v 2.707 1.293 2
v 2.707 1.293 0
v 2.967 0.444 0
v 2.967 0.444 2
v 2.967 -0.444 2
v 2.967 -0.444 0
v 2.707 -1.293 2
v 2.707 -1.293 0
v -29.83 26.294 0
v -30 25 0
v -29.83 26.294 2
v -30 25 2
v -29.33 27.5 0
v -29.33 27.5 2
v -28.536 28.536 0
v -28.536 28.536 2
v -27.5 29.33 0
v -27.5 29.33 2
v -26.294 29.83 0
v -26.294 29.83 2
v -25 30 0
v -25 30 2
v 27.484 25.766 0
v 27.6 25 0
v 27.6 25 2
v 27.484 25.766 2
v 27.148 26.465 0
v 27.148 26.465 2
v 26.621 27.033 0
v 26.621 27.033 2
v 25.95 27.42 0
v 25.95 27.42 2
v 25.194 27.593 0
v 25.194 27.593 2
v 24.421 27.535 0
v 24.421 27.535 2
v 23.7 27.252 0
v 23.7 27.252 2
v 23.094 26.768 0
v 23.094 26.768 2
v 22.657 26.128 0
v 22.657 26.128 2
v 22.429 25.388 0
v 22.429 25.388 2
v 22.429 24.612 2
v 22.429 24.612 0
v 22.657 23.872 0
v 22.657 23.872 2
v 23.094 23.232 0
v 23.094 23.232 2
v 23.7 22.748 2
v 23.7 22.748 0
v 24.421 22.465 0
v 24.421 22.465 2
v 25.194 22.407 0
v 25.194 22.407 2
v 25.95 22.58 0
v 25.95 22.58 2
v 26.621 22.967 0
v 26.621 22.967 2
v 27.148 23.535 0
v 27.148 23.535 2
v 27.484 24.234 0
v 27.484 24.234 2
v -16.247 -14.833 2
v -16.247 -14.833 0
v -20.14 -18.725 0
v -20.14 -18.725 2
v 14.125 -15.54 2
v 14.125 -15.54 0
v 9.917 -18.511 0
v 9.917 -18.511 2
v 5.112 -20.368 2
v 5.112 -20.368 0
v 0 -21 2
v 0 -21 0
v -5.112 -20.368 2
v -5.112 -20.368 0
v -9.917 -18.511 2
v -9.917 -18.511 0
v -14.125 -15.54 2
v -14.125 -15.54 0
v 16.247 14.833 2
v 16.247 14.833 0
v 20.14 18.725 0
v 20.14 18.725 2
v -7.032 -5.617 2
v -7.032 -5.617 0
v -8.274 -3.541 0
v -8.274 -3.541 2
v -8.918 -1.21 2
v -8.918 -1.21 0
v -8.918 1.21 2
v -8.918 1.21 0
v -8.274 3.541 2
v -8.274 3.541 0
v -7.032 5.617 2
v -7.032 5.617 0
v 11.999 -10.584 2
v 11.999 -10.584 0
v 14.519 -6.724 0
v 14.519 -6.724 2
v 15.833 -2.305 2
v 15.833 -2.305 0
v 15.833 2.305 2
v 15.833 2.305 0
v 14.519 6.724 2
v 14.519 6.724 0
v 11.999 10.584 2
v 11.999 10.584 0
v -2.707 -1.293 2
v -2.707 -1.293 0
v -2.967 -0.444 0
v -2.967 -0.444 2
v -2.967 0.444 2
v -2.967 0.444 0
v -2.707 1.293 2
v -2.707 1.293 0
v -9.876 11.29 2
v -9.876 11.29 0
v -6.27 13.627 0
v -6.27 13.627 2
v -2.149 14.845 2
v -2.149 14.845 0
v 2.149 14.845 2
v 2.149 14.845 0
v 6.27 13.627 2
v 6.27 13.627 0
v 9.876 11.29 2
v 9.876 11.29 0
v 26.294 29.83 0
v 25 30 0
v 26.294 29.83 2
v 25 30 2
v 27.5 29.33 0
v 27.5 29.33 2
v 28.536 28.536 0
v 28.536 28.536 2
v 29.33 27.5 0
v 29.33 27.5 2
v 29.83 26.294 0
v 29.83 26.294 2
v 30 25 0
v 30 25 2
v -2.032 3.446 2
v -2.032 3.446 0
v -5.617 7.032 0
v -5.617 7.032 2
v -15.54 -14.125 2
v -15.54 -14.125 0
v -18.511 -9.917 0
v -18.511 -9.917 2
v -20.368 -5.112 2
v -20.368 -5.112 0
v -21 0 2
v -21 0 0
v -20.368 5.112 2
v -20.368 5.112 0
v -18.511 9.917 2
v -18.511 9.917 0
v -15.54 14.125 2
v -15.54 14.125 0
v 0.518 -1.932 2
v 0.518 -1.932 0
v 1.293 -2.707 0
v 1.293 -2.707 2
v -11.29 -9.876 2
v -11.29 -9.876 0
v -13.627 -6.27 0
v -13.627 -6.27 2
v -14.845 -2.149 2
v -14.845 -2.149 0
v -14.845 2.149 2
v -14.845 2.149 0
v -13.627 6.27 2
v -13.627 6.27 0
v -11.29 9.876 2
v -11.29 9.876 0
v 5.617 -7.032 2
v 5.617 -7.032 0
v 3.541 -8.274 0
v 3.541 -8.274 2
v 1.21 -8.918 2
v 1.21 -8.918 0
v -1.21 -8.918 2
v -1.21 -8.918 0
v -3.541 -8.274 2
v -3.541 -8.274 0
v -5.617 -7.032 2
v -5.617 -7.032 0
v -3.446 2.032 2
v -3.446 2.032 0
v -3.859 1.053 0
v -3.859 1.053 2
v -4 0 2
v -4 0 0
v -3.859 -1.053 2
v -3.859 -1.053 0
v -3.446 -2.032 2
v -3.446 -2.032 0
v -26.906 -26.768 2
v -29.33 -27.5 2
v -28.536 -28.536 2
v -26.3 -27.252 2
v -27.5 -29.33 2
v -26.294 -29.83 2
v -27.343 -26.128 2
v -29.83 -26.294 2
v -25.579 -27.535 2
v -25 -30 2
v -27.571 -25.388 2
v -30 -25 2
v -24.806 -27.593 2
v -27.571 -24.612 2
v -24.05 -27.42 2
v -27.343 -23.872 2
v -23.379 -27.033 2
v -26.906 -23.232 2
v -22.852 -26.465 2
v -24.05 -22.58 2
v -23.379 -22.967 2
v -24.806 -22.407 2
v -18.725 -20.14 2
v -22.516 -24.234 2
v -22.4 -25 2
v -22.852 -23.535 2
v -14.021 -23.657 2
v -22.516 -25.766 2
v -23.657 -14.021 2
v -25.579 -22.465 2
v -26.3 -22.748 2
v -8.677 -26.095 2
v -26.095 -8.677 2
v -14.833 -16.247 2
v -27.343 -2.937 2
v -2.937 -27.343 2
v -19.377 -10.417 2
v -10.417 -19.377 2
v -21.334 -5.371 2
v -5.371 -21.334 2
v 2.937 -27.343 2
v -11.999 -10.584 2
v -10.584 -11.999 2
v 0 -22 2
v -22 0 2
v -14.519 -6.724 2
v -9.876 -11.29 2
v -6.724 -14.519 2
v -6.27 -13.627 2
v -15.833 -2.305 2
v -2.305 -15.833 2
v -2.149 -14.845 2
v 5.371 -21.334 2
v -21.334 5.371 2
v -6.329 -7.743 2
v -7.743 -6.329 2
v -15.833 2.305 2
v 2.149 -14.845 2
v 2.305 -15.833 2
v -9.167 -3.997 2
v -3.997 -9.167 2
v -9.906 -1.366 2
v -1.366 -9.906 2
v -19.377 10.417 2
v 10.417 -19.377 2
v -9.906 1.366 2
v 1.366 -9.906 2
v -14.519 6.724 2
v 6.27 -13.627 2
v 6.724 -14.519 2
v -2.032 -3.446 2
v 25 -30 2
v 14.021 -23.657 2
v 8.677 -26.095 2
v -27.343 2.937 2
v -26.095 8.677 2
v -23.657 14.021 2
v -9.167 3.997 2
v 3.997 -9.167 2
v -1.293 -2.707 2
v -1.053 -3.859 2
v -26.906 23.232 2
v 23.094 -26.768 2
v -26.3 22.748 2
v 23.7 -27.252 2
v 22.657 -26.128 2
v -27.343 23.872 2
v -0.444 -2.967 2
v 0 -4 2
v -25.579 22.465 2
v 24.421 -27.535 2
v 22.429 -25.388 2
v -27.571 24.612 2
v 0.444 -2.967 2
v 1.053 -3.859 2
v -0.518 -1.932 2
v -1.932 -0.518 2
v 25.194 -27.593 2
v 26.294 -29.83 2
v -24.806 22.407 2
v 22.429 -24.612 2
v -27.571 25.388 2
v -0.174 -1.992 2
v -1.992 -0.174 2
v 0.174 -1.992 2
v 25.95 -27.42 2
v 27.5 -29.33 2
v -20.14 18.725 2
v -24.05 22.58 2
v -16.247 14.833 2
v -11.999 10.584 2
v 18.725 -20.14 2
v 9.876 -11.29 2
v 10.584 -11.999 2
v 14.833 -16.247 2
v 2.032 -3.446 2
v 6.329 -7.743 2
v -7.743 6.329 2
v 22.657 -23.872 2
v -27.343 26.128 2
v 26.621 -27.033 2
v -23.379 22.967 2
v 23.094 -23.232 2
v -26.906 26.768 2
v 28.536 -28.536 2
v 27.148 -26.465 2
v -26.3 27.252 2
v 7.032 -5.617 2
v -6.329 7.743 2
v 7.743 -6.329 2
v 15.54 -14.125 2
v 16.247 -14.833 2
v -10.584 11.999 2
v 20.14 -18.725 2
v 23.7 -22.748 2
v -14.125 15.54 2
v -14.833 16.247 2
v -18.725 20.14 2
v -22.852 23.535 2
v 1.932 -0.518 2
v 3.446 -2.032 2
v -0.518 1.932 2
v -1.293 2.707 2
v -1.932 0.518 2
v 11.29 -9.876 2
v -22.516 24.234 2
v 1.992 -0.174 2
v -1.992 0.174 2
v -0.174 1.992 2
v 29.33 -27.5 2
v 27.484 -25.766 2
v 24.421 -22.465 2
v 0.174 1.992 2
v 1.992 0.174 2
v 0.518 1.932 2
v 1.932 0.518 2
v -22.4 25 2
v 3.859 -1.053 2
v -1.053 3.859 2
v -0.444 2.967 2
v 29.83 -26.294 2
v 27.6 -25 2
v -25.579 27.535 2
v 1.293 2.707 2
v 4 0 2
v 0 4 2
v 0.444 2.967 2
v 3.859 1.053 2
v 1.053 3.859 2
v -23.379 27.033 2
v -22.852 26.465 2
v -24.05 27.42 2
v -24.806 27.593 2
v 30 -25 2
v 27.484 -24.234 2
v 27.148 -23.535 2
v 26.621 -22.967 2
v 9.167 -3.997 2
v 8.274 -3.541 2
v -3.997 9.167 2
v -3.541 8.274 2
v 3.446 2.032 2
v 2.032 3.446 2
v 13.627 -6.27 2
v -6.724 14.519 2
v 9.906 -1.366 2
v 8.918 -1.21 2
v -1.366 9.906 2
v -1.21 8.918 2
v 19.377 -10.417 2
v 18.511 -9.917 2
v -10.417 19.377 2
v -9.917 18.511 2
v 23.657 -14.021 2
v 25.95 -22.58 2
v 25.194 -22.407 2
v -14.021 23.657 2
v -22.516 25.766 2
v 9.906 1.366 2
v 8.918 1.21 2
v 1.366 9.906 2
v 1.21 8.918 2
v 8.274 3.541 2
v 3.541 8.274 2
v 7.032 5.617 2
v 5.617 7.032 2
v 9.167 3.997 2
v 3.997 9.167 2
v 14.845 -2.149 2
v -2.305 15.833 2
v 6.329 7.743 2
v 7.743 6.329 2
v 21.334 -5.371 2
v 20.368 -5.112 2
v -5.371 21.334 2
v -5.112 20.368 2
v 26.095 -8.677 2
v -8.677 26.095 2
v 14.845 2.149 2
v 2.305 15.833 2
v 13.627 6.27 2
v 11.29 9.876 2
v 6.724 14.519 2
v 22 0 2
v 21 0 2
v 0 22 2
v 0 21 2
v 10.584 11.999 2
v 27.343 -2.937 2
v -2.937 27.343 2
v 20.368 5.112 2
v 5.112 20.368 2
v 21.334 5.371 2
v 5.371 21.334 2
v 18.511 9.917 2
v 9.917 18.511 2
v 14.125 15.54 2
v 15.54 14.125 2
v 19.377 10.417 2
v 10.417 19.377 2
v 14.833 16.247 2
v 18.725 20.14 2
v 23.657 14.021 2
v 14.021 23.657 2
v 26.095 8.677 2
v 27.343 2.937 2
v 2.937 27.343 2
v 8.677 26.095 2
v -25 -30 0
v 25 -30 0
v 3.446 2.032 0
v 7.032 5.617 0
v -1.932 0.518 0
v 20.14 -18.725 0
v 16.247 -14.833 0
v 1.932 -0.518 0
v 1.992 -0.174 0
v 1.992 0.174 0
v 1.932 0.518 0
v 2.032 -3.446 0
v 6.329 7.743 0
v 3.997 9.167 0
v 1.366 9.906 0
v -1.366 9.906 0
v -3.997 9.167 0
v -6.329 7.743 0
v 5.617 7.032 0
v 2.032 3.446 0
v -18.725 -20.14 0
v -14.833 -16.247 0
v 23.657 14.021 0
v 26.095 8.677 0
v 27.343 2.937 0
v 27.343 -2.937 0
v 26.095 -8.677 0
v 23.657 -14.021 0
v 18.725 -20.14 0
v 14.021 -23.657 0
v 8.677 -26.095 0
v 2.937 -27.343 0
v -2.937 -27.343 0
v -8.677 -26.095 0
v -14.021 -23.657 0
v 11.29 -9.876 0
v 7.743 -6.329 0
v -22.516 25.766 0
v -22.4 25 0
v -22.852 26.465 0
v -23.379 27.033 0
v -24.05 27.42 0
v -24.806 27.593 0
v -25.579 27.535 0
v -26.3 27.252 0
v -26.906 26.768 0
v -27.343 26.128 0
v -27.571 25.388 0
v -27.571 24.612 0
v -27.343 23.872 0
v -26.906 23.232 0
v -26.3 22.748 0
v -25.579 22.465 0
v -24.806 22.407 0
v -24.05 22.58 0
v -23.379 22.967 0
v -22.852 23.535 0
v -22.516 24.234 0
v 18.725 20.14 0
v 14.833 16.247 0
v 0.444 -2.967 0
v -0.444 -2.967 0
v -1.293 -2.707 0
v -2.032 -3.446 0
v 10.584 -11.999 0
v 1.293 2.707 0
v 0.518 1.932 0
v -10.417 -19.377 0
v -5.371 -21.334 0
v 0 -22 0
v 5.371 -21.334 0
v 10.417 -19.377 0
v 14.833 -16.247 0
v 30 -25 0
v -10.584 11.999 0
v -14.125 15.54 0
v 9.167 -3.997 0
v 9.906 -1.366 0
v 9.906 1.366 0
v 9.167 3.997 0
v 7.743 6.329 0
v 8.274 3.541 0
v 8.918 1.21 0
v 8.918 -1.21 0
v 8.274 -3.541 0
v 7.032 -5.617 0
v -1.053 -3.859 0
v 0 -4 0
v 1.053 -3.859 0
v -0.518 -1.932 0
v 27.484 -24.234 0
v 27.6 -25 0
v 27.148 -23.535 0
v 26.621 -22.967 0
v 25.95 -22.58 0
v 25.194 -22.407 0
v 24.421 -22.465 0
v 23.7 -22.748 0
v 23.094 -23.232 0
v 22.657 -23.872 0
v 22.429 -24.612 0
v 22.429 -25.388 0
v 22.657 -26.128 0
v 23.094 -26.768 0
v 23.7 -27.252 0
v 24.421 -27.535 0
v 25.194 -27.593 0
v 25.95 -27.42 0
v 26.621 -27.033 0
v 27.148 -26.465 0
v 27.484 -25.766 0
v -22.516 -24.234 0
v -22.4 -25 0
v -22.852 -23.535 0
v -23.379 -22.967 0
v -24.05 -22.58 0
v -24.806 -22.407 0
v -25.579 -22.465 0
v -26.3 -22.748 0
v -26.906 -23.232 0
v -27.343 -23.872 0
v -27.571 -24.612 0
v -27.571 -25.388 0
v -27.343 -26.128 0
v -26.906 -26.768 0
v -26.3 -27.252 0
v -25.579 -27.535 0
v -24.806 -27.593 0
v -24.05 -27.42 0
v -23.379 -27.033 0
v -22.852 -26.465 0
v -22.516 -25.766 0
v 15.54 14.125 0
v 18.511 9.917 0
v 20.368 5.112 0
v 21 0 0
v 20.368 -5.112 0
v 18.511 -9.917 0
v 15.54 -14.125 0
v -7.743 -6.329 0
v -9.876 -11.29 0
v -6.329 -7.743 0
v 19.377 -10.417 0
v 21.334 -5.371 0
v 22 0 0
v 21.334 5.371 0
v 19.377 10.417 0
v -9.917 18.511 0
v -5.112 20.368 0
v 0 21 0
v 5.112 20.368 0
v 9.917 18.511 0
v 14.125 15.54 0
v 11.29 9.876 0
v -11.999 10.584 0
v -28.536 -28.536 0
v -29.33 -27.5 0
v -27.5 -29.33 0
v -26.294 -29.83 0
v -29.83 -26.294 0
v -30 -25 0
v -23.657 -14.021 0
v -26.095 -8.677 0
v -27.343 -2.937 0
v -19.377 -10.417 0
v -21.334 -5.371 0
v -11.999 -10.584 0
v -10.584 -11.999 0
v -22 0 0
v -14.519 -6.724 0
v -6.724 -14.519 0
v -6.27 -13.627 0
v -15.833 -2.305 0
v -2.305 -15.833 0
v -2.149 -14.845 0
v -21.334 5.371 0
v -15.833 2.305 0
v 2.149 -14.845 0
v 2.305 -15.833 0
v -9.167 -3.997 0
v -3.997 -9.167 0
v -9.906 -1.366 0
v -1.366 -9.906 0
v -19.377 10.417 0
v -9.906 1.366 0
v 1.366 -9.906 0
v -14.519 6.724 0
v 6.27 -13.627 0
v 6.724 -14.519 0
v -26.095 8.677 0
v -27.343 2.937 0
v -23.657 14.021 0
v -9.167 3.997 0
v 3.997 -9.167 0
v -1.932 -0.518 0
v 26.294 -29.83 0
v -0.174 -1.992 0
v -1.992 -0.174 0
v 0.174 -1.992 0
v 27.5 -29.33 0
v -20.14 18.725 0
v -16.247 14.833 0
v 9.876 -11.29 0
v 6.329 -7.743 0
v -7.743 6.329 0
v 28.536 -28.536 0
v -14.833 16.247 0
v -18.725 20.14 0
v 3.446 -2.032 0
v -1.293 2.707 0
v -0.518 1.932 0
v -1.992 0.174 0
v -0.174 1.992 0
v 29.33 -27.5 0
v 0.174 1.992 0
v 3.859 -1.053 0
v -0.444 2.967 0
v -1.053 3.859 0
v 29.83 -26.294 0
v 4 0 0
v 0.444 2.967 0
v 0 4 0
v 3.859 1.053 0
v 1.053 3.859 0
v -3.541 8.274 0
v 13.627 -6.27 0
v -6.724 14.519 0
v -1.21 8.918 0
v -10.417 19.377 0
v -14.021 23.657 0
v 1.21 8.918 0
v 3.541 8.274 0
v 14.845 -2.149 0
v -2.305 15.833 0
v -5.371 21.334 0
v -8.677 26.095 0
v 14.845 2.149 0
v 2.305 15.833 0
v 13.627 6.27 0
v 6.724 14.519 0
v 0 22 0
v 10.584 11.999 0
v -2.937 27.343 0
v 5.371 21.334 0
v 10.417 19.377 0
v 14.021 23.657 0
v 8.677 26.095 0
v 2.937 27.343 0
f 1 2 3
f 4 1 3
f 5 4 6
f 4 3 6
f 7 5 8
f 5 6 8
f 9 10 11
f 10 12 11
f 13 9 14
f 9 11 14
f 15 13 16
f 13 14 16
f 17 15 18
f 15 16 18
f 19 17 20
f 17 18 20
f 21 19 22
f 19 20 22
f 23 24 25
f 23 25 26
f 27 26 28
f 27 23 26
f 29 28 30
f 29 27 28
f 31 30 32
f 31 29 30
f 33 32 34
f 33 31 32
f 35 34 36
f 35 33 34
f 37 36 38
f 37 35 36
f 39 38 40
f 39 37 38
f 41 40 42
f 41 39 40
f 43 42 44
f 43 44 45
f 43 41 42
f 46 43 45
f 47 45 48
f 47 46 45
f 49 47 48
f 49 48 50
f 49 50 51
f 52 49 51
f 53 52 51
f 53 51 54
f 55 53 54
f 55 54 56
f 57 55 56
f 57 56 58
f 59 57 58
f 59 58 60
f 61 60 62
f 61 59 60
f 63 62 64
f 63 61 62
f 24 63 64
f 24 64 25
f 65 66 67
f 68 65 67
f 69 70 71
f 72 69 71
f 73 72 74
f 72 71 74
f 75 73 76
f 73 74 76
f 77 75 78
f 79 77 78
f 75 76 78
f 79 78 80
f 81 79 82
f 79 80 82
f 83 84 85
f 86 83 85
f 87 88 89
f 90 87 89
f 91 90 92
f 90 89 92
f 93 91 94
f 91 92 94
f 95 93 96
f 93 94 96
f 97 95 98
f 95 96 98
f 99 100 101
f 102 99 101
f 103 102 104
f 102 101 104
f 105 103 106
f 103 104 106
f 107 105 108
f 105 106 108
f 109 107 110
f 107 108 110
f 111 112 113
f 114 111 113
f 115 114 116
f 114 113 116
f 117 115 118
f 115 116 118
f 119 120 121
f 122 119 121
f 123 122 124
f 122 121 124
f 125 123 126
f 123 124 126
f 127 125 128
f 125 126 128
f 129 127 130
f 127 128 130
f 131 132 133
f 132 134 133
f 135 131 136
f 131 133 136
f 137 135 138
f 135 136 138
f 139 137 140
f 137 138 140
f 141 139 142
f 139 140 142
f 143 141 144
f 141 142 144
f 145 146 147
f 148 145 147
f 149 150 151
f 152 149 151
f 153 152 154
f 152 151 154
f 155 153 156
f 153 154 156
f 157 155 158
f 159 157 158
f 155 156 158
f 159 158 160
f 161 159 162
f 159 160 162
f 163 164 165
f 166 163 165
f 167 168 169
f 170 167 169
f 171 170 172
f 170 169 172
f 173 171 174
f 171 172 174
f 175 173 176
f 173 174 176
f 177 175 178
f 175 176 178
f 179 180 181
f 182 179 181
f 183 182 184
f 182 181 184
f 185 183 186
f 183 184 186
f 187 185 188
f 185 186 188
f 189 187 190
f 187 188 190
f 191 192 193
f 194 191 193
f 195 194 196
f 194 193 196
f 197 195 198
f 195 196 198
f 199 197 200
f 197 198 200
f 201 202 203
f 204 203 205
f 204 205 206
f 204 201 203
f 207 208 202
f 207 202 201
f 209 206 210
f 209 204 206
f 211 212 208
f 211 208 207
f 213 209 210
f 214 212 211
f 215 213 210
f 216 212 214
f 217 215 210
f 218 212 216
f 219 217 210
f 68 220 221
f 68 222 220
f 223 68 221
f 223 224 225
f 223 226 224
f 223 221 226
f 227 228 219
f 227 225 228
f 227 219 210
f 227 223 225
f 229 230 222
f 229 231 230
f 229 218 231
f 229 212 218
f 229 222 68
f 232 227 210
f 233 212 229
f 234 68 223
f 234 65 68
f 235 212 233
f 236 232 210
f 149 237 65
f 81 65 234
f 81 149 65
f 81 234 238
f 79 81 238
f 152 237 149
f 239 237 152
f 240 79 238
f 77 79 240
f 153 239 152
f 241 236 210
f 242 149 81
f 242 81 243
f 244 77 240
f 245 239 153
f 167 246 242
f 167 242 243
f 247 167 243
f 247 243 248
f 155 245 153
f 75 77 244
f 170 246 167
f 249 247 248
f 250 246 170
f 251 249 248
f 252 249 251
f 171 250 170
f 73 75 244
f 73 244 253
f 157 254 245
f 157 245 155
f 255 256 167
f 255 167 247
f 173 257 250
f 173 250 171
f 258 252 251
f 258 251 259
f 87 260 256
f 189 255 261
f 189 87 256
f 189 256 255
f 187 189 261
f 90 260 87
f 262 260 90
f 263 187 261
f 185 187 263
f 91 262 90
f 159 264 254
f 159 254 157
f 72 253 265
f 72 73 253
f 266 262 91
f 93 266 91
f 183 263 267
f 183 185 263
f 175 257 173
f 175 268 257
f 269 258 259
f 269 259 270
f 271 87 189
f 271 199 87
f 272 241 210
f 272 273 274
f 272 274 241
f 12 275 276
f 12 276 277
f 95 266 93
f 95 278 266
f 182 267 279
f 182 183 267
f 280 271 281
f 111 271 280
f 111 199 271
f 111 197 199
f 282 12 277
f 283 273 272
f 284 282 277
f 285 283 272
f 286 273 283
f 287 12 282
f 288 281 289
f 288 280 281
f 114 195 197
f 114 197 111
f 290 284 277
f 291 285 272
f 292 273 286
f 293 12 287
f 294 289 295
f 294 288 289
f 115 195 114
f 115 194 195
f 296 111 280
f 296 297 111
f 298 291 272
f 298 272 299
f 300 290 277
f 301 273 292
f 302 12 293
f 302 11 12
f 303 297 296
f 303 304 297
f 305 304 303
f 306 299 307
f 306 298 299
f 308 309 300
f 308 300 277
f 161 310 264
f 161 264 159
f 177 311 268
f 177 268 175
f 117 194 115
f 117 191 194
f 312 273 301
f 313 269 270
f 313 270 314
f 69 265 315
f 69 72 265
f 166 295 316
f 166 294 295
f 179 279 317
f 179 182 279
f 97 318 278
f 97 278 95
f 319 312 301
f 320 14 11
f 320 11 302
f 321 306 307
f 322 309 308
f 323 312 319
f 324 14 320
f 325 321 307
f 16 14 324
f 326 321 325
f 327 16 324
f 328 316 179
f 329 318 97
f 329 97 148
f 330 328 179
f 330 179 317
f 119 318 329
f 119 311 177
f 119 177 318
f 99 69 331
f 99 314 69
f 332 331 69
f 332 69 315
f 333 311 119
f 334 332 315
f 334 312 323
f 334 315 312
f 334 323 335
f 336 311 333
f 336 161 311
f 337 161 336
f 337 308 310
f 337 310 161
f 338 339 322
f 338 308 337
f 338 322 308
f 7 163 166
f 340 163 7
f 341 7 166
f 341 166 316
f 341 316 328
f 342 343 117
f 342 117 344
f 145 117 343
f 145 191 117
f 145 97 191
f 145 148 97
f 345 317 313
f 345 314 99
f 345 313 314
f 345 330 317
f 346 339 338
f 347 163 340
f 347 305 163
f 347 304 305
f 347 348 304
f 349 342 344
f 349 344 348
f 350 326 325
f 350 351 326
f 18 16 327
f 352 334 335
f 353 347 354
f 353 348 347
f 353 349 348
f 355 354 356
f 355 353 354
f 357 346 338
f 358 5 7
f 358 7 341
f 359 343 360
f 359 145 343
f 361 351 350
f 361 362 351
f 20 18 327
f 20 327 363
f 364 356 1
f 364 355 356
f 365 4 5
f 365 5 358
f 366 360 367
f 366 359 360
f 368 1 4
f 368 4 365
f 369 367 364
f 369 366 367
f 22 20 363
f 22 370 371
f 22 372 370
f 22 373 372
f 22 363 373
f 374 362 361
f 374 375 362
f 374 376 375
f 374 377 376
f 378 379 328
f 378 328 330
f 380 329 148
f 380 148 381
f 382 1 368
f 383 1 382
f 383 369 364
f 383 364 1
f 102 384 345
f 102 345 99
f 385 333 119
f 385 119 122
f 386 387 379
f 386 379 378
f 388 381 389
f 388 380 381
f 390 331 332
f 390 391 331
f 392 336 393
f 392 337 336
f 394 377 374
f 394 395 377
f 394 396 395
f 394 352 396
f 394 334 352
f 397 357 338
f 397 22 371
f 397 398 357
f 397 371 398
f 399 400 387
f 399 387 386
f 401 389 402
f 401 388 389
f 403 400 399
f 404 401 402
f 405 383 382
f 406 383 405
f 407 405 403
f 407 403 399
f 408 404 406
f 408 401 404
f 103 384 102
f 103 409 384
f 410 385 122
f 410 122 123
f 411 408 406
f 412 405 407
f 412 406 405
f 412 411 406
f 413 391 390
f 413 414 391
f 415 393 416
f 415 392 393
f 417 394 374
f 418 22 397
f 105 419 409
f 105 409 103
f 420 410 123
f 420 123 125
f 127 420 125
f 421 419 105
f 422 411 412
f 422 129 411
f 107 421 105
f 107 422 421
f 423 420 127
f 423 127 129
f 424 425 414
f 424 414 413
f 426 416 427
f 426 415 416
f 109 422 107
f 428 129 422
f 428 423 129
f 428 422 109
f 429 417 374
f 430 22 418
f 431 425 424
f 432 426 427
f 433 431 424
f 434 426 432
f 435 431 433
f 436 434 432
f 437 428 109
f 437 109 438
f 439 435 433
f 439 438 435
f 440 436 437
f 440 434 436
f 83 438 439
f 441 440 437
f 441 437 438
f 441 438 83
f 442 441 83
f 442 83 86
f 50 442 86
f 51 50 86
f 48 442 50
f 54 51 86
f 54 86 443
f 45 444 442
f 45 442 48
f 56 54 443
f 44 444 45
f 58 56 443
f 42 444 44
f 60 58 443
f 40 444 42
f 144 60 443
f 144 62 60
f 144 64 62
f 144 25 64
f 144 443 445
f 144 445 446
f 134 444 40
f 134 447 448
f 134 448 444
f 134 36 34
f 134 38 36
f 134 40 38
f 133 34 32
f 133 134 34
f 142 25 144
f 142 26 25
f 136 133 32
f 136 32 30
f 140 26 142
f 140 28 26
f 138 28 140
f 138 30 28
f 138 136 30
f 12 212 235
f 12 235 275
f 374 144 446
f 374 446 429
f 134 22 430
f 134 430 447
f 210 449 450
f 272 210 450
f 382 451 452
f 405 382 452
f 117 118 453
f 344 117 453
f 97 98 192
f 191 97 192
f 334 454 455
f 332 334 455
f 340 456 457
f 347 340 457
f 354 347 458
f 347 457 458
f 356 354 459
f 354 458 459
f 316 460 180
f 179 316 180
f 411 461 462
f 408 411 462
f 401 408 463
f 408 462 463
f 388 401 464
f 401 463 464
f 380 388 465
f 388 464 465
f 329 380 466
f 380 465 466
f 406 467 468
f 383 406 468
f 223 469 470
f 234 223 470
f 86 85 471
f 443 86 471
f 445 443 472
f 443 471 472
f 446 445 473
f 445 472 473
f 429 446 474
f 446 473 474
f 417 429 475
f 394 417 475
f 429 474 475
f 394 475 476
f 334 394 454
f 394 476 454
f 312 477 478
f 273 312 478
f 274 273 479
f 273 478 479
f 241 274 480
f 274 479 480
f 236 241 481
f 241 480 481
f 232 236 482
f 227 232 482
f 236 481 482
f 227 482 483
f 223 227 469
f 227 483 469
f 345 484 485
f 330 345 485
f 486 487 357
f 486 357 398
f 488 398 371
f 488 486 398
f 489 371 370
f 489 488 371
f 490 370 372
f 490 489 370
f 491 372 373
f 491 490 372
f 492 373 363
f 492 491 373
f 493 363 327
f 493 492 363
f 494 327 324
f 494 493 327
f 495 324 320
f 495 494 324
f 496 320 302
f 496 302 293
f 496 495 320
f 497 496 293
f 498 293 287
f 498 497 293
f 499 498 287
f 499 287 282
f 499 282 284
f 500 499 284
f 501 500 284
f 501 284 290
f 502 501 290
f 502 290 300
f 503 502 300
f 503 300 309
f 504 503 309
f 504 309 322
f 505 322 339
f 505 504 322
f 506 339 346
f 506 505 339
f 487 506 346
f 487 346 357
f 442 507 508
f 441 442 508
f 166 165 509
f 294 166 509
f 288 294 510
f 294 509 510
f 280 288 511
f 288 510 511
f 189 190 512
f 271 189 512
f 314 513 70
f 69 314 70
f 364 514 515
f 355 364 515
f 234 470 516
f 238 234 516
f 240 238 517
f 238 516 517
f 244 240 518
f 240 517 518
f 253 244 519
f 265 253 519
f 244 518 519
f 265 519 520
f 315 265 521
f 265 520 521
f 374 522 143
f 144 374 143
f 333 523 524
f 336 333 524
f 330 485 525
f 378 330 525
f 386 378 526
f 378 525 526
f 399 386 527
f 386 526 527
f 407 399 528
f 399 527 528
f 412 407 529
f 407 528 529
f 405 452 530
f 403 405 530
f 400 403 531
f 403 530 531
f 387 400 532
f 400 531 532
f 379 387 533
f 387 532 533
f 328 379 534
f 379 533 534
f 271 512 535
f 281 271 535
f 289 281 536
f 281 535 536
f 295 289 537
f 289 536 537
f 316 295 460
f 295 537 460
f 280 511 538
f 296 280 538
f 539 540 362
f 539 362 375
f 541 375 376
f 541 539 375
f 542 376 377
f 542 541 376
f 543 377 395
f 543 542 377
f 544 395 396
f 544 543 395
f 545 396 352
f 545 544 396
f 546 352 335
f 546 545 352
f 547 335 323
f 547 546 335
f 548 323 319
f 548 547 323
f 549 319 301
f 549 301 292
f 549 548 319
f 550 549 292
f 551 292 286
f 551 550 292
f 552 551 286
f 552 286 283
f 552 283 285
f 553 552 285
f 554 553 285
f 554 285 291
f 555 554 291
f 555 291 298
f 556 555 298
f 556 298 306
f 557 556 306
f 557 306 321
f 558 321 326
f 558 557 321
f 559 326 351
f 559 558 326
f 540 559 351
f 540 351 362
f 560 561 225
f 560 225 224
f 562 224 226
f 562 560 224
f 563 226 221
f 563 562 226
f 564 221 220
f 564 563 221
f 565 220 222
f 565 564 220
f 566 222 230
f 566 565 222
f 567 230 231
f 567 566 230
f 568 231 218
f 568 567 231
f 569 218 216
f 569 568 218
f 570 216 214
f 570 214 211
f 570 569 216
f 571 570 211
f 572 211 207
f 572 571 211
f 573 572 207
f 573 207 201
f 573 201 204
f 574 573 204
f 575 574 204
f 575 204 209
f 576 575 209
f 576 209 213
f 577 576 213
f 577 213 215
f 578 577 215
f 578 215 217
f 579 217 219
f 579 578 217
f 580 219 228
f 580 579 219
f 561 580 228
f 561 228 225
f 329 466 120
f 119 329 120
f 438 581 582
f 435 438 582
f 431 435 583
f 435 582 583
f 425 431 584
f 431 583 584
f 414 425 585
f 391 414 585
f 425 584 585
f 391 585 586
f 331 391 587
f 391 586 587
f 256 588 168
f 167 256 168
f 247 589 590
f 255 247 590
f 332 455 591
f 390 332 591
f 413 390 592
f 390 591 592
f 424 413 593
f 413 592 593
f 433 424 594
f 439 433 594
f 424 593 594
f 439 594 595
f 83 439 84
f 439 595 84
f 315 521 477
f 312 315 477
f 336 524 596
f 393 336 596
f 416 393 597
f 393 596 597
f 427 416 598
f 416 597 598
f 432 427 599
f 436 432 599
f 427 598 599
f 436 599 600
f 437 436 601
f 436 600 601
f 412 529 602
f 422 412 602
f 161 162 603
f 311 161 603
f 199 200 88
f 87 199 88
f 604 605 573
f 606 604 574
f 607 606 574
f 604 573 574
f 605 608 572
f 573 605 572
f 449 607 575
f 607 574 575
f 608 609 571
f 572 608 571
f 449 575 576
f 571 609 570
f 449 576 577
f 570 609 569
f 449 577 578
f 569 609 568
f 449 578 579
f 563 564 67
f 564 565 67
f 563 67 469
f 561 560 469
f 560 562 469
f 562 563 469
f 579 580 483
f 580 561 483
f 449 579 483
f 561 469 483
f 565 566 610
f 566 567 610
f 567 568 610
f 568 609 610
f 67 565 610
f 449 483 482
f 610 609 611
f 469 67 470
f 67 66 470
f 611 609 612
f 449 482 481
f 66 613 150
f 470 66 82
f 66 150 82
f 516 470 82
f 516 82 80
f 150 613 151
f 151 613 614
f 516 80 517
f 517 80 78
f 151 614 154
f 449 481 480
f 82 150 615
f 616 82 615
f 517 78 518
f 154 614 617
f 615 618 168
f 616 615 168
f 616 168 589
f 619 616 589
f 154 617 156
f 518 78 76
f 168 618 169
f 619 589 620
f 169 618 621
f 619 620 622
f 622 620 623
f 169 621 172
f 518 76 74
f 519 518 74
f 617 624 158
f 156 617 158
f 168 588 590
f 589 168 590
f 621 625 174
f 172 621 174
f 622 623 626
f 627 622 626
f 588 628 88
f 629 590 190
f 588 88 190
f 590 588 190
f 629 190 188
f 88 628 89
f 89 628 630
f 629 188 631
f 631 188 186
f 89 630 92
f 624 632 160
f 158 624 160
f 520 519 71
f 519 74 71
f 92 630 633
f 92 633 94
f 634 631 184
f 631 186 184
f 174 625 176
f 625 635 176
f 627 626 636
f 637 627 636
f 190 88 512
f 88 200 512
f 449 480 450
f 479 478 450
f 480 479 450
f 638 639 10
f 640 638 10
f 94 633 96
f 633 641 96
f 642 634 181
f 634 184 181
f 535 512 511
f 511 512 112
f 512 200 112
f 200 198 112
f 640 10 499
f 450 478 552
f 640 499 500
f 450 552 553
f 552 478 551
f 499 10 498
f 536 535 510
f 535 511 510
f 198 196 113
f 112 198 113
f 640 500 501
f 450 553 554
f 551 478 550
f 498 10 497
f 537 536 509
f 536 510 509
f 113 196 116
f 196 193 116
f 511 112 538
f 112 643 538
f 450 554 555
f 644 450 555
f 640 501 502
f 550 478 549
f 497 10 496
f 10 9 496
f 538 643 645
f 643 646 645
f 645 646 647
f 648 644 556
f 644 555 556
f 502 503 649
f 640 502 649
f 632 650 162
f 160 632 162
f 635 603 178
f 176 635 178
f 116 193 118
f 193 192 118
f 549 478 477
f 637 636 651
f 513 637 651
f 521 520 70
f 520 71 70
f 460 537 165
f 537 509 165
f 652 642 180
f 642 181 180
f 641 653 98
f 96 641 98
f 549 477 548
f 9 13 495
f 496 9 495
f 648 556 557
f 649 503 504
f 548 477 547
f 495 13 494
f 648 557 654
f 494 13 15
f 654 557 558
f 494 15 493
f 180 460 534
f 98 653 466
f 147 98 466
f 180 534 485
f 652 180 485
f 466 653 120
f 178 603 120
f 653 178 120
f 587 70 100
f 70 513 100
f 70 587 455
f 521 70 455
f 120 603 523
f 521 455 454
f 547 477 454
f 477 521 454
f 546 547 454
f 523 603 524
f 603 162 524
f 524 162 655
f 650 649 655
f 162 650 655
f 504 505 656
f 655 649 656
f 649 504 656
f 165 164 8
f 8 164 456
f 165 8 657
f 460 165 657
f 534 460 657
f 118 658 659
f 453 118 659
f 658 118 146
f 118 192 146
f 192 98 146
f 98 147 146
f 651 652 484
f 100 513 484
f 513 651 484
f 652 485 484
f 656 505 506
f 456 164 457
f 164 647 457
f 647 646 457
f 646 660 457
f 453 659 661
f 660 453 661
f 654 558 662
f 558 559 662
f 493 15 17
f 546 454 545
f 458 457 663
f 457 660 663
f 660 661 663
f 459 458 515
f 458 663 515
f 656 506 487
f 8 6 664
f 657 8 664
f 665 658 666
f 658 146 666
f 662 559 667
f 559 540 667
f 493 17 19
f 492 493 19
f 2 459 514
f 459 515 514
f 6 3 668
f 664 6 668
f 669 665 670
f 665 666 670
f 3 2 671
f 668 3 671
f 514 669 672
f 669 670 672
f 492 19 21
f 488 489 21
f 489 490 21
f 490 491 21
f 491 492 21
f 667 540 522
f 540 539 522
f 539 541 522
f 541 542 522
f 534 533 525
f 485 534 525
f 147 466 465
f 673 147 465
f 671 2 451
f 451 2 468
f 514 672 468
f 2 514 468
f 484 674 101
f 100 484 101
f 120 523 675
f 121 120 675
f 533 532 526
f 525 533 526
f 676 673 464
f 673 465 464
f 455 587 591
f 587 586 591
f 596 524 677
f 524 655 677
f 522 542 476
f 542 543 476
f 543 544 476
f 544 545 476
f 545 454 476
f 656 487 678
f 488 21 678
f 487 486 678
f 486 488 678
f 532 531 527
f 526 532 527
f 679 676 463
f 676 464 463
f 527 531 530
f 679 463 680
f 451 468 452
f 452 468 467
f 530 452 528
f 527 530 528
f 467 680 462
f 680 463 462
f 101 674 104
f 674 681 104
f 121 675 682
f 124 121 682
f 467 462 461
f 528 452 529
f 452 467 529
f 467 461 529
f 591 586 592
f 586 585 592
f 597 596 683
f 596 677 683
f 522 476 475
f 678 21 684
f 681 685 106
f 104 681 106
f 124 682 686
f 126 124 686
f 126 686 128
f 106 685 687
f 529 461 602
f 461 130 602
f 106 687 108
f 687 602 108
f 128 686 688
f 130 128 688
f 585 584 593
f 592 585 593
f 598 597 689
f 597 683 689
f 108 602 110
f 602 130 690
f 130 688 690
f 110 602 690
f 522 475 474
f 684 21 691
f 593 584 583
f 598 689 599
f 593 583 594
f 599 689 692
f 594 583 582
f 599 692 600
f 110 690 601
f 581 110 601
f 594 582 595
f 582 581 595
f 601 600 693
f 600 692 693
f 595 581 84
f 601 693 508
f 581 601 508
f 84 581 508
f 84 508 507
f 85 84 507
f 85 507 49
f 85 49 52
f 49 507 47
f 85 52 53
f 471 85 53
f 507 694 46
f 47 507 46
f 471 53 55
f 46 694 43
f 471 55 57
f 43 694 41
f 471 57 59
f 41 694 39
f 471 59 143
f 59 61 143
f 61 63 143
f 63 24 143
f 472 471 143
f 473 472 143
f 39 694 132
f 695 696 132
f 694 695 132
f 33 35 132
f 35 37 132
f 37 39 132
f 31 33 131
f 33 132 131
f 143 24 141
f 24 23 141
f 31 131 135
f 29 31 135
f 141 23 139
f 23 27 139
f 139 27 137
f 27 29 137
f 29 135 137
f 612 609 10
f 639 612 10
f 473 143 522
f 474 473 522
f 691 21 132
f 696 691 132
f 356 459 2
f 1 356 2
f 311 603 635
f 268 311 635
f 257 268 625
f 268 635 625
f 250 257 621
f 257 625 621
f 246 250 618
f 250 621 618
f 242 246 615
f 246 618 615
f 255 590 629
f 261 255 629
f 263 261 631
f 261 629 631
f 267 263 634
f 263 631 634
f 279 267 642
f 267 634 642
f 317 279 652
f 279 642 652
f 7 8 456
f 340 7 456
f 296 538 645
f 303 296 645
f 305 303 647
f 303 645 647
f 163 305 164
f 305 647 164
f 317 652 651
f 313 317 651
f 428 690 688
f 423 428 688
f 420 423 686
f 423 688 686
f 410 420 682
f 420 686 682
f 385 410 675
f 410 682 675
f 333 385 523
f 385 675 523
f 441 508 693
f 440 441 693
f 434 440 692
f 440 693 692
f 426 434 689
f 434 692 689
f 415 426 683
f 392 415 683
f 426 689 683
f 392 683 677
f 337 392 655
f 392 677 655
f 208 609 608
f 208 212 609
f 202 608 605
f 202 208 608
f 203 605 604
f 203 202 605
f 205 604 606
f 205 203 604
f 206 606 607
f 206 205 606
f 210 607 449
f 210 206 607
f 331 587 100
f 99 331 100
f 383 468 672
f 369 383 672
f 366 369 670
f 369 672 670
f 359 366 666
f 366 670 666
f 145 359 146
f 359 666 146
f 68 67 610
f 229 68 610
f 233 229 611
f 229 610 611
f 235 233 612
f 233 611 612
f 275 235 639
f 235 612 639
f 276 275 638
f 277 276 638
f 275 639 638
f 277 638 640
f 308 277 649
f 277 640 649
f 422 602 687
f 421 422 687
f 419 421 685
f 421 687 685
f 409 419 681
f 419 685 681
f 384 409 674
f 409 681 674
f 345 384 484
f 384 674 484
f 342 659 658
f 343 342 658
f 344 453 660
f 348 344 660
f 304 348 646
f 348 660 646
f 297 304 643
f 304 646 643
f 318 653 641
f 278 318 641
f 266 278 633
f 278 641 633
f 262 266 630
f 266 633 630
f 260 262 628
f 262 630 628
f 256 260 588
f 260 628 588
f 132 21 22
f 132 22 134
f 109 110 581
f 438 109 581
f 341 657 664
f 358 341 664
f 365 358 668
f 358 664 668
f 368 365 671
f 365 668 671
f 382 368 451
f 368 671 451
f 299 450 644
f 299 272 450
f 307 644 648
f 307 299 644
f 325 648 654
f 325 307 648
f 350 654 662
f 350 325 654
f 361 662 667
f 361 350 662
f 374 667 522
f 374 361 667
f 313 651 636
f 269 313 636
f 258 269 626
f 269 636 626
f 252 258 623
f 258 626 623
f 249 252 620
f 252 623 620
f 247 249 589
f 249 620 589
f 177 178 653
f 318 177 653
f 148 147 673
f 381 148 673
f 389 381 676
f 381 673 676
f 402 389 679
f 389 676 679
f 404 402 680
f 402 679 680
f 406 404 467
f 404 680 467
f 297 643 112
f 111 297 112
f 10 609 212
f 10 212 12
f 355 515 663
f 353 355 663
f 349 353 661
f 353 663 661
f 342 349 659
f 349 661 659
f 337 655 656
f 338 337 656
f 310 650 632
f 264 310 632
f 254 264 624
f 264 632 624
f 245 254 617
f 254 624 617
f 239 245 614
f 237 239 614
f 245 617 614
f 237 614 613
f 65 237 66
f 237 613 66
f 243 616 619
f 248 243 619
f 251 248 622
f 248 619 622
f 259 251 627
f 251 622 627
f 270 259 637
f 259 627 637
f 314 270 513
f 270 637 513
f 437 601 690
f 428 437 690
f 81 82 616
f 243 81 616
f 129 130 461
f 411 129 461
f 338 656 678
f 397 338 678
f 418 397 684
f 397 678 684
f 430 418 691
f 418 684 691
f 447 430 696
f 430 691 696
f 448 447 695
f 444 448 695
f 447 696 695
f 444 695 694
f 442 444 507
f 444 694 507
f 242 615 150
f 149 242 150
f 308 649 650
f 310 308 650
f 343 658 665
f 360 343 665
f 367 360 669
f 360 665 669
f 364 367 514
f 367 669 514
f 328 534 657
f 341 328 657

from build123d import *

# Parameters (mm, degrees)
F0_W     = 60
F0_H     = 60
F0_R     = 2.6
F1_DEPTH = 2
F2_R     = 5


with BuildPart() as f1:
    # F0 (on Top) → F1 (new body)
    with BuildSketch(Plane.XY):
        Rectangle(F0_W, F0_H)
        with Locations((-25, -25)):
            Circle(F0_R, mode=Mode.SUBTRACT)
        with BuildLine():
            Line((-15.539504, 14.12529), (-11.998697, 10.584483))
            ThreePointArc((-11.998697, 10.584483), (-16, 0), (-11.998697, -10.584483))
            Line((-11.998697, -10.584483), (-15.539504, -14.12529))
            ThreePointArc((-15.539504, -14.12529), (-21, 0), (-15.539504, 14.12529))
        make_face(mode=Mode.SUBTRACT)
        with BuildLine():
            ThreePointArc((18.725469, -20.139683), (0, -27.5), (-18.725469, -20.139683))
            Line((-18.725469, -20.139683), (-14.833163, -16.247377))
            ThreePointArc((-14.833163, -16.247377), (0, -22), (14.833163, -16.247377))
            Line((14.833163, -16.247377), (18.725469, -20.139683))
        make_face(mode=Mode.SUBTRACT)
        with BuildLine():
            ThreePointArc((14.12529, -15.539504), (0, -21), (-14.12529, -15.539504))
            Line((-14.12529, -15.539504), (-10.584483, -11.998697))
            ThreePointArc((-10.584483, -11.998697), (0, -16), (10.584483, -11.998697))
            Line((10.584483, -11.998697), (14.12529, -15.539504))
        make_face(mode=Mode.SUBTRACT)
        with Locations((25, -25)):
            Circle(F0_R, mode=Mode.SUBTRACT)
        with BuildLine():
            Line((-9.875898, -11.290112), (-6.328517, -7.74273))
            ThreePointArc((-6.328517, -7.74273), (0, -10), (6.328517, -7.74273))
            Line((6.328517, -7.74273), (9.875898, -11.290112))
            ThreePointArc((9.875898, -11.290112), (0, -15), (-9.875898, -11.290112))
        make_face(mode=Mode.SUBTRACT)
        with BuildLine():
            Line((-5.617449, -7.031662), (-2.031506, -3.44572))
            ThreePointArc((-2.031506, -3.44572), (0, -4), (2.031506, -3.44572))
            Line((2.031506, -3.44572), (5.617449, -7.031662))
            ThreePointArc((5.617449, -7.031662), (0, -9), (-5.617449, -7.031662))
        make_face(mode=Mode.SUBTRACT)
        with BuildLine():
            Line((0.517638, -1.931852), (1.292893, -2.707107))
            ThreePointArc((1.292893, -2.707107), (0, -3), (-1.292893, -2.707107))
            Line((-1.292893, -2.707107), (-0.517638, -1.931852))
            ThreePointArc((-0.517638, -1.931852), (0, -2), (0.517638, -1.931852))
        make_face(mode=Mode.SUBTRACT)
        with BuildLine():
            Line((-20.139683, 18.725469), (-16.247377, 14.833163))
            ThreePointArc((-16.247377, 14.833163), (-22, 0), (-16.247377, -14.833163))
            Line((-16.247377, -14.833163), (-20.139683, -18.725469))
            ThreePointArc((-20.139683, -18.725469), (-27.5, 0), (-20.139683, 18.725469))
        make_face(mode=Mode.SUBTRACT)
        with BuildLine():
            ThreePointArc((-11.290112, -9.875898), (-15, 0), (-11.290112, 9.875898))
            Line((-11.290112, 9.875898), (-7.74273, 6.328517))
            ThreePointArc((-7.74273, 6.328517), (-10, 0), (-7.74273, -6.328517))
            Line((-7.74273, -6.328517), (-11.290112, -9.875898))
        make_face(mode=Mode.SUBTRACT)
        with BuildLine():
            ThreePointArc((-7.031662, -5.617449), (-9, 0), (-7.031662, 5.617449))
            Line((-7.031662, 5.617449), (-3.44572, 2.031506))
            ThreePointArc((-3.44572, 2.031506), (-4, 0), (-3.44572, -2.031506))
            Line((-3.44572, -2.031506), (-7.031662, -5.617449))
        make_face(mode=Mode.SUBTRACT)
        with BuildLine():
            ThreePointArc((-2.707107, -1.292893), (-3, 0), (-2.707107, 1.292893))
            Line((-2.707107, 1.292893), (-1.931852, 0.517638))
            ThreePointArc((-1.931852, 0.517638), (-2, 0), (-1.931852, -0.517638))
            Line((-1.931852, -0.517638), (-2.707107, -1.292893))
        make_face(mode=Mode.SUBTRACT)
        with Locations((-25, 25)):
            Circle(F0_R, mode=Mode.SUBTRACT)
        with BuildLine():
            Line((2.707107, -1.292893), (1.931852, -0.517638))
            ThreePointArc((1.931852, -0.517638), (2, 0), (1.931852, 0.517638))
            Line((1.931852, 0.517638), (2.707107, 1.292893))
            ThreePointArc((2.707107, 1.292893), (3, 0), (2.707107, -1.292893))
        make_face(mode=Mode.SUBTRACT)
        with BuildLine():
            Line((-0.517638, 1.931852), (-1.292893, 2.707107))
            ThreePointArc((-1.292893, 2.707107), (0, 3), (1.292893, 2.707107))
            Line((1.292893, 2.707107), (0.517638, 1.931852))
            ThreePointArc((0.517638, 1.931852), (0, 2), (-0.517638, 1.931852))
        make_face(mode=Mode.SUBTRACT)
        with BuildLine():
            Line((7.031662, -5.617449), (3.44572, -2.031506))
            ThreePointArc((3.44572, -2.031506), (4, 0), (3.44572, 2.031506))
            Line((3.44572, 2.031506), (7.031662, 5.617449))
            ThreePointArc((7.031662, 5.617449), (9, 0), (7.031662, -5.617449))
        make_face(mode=Mode.SUBTRACT)
        with BuildLine():
            Line((-2.031506, 3.44572), (-5.617449, 7.031662))
            ThreePointArc((-5.617449, 7.031662), (0, 9), (5.617449, 7.031662))
            Line((5.617449, 7.031662), (2.031506, 3.44572))
            ThreePointArc((2.031506, 3.44572), (0, 4), (-2.031506, 3.44572))
        make_face(mode=Mode.SUBTRACT)
        with BuildLine():
            ThreePointArc((11.290112, 9.875898), (15, 0), (11.290112, -9.875898))
            Line((11.290112, -9.875898), (7.74273, -6.328517))
            ThreePointArc((7.74273, -6.328517), (10, 0), (7.74273, 6.328517))
            Line((7.74273, 6.328517), (11.290112, 9.875898))
        make_face(mode=Mode.SUBTRACT)
        with BuildLine():
            Line((-6.328517, 7.74273), (-9.875898, 11.290112))
            ThreePointArc((-9.875898, 11.290112), (0, 15), (9.875898, 11.290112))
            Line((9.875898, 11.290112), (6.328517, 7.74273))
            ThreePointArc((6.328517, 7.74273), (0, 10), (-6.328517, 7.74273))
        make_face(mode=Mode.SUBTRACT)
        with BuildLine():
            Line((15.539504, -14.12529), (11.998697, -10.584483))
            ThreePointArc((11.998697, -10.584483), (16, 0), (11.998697, 10.584483))
            Line((11.998697, 10.584483), (15.539504, 14.12529))
            ThreePointArc((15.539504, 14.12529), (21, 0), (15.539504, -14.12529))
        make_face(mode=Mode.SUBTRACT)
        with BuildLine():
            Line((16.247377, 14.833163), (20.139683, 18.725469))
            ThreePointArc((20.139683, 18.725469), (27.5, 0), (20.139683, -18.725469))
            Line((20.139683, -18.725469), (16.247377, -14.833163))
            ThreePointArc((16.247377, -14.833163), (22, 0), (16.247377, 14.833163))
        make_face(mode=Mode.SUBTRACT)
        with BuildLine():
            Line((-10.584483, 11.998697), (-14.12529, 15.539504))
            ThreePointArc((-14.12529, 15.539504), (0, 21), (14.12529, 15.539504))
            Line((14.12529, 15.539504), (10.584483, 11.998697))
            ThreePointArc((10.584483, 11.998697), (0, 16), (-10.584483, 11.998697))
        make_face(mode=Mode.SUBTRACT)
        with BuildLine():
            Line((-14.833163, 16.247377), (-18.725469, 20.139683))
            ThreePointArc((-18.725469, 20.139683), (0, 27.5), (18.725469, 20.139683))
            Line((18.725469, 20.139683), (14.833163, 16.247377))
            ThreePointArc((14.833163, 16.247377), (0, 22), (-14.833163, 16.247377))
        make_face(mode=Mode.SUBTRACT)
        with Locations((25, 25)):
            Circle(F0_R, mode=Mode.SUBTRACT)
    extrude(amount=F1_DEPTH)

    # F2
    f2_edges = [f1.edges().sort_by_distance(p)[0] for p in [
        (30, 30, 1),
        (-30, 30, 1),
        (-30, -30, 1),
        (30, -30, 1),
    ]]
    fillet(f2_edges, radius=F2_R)


solid = f1.part
